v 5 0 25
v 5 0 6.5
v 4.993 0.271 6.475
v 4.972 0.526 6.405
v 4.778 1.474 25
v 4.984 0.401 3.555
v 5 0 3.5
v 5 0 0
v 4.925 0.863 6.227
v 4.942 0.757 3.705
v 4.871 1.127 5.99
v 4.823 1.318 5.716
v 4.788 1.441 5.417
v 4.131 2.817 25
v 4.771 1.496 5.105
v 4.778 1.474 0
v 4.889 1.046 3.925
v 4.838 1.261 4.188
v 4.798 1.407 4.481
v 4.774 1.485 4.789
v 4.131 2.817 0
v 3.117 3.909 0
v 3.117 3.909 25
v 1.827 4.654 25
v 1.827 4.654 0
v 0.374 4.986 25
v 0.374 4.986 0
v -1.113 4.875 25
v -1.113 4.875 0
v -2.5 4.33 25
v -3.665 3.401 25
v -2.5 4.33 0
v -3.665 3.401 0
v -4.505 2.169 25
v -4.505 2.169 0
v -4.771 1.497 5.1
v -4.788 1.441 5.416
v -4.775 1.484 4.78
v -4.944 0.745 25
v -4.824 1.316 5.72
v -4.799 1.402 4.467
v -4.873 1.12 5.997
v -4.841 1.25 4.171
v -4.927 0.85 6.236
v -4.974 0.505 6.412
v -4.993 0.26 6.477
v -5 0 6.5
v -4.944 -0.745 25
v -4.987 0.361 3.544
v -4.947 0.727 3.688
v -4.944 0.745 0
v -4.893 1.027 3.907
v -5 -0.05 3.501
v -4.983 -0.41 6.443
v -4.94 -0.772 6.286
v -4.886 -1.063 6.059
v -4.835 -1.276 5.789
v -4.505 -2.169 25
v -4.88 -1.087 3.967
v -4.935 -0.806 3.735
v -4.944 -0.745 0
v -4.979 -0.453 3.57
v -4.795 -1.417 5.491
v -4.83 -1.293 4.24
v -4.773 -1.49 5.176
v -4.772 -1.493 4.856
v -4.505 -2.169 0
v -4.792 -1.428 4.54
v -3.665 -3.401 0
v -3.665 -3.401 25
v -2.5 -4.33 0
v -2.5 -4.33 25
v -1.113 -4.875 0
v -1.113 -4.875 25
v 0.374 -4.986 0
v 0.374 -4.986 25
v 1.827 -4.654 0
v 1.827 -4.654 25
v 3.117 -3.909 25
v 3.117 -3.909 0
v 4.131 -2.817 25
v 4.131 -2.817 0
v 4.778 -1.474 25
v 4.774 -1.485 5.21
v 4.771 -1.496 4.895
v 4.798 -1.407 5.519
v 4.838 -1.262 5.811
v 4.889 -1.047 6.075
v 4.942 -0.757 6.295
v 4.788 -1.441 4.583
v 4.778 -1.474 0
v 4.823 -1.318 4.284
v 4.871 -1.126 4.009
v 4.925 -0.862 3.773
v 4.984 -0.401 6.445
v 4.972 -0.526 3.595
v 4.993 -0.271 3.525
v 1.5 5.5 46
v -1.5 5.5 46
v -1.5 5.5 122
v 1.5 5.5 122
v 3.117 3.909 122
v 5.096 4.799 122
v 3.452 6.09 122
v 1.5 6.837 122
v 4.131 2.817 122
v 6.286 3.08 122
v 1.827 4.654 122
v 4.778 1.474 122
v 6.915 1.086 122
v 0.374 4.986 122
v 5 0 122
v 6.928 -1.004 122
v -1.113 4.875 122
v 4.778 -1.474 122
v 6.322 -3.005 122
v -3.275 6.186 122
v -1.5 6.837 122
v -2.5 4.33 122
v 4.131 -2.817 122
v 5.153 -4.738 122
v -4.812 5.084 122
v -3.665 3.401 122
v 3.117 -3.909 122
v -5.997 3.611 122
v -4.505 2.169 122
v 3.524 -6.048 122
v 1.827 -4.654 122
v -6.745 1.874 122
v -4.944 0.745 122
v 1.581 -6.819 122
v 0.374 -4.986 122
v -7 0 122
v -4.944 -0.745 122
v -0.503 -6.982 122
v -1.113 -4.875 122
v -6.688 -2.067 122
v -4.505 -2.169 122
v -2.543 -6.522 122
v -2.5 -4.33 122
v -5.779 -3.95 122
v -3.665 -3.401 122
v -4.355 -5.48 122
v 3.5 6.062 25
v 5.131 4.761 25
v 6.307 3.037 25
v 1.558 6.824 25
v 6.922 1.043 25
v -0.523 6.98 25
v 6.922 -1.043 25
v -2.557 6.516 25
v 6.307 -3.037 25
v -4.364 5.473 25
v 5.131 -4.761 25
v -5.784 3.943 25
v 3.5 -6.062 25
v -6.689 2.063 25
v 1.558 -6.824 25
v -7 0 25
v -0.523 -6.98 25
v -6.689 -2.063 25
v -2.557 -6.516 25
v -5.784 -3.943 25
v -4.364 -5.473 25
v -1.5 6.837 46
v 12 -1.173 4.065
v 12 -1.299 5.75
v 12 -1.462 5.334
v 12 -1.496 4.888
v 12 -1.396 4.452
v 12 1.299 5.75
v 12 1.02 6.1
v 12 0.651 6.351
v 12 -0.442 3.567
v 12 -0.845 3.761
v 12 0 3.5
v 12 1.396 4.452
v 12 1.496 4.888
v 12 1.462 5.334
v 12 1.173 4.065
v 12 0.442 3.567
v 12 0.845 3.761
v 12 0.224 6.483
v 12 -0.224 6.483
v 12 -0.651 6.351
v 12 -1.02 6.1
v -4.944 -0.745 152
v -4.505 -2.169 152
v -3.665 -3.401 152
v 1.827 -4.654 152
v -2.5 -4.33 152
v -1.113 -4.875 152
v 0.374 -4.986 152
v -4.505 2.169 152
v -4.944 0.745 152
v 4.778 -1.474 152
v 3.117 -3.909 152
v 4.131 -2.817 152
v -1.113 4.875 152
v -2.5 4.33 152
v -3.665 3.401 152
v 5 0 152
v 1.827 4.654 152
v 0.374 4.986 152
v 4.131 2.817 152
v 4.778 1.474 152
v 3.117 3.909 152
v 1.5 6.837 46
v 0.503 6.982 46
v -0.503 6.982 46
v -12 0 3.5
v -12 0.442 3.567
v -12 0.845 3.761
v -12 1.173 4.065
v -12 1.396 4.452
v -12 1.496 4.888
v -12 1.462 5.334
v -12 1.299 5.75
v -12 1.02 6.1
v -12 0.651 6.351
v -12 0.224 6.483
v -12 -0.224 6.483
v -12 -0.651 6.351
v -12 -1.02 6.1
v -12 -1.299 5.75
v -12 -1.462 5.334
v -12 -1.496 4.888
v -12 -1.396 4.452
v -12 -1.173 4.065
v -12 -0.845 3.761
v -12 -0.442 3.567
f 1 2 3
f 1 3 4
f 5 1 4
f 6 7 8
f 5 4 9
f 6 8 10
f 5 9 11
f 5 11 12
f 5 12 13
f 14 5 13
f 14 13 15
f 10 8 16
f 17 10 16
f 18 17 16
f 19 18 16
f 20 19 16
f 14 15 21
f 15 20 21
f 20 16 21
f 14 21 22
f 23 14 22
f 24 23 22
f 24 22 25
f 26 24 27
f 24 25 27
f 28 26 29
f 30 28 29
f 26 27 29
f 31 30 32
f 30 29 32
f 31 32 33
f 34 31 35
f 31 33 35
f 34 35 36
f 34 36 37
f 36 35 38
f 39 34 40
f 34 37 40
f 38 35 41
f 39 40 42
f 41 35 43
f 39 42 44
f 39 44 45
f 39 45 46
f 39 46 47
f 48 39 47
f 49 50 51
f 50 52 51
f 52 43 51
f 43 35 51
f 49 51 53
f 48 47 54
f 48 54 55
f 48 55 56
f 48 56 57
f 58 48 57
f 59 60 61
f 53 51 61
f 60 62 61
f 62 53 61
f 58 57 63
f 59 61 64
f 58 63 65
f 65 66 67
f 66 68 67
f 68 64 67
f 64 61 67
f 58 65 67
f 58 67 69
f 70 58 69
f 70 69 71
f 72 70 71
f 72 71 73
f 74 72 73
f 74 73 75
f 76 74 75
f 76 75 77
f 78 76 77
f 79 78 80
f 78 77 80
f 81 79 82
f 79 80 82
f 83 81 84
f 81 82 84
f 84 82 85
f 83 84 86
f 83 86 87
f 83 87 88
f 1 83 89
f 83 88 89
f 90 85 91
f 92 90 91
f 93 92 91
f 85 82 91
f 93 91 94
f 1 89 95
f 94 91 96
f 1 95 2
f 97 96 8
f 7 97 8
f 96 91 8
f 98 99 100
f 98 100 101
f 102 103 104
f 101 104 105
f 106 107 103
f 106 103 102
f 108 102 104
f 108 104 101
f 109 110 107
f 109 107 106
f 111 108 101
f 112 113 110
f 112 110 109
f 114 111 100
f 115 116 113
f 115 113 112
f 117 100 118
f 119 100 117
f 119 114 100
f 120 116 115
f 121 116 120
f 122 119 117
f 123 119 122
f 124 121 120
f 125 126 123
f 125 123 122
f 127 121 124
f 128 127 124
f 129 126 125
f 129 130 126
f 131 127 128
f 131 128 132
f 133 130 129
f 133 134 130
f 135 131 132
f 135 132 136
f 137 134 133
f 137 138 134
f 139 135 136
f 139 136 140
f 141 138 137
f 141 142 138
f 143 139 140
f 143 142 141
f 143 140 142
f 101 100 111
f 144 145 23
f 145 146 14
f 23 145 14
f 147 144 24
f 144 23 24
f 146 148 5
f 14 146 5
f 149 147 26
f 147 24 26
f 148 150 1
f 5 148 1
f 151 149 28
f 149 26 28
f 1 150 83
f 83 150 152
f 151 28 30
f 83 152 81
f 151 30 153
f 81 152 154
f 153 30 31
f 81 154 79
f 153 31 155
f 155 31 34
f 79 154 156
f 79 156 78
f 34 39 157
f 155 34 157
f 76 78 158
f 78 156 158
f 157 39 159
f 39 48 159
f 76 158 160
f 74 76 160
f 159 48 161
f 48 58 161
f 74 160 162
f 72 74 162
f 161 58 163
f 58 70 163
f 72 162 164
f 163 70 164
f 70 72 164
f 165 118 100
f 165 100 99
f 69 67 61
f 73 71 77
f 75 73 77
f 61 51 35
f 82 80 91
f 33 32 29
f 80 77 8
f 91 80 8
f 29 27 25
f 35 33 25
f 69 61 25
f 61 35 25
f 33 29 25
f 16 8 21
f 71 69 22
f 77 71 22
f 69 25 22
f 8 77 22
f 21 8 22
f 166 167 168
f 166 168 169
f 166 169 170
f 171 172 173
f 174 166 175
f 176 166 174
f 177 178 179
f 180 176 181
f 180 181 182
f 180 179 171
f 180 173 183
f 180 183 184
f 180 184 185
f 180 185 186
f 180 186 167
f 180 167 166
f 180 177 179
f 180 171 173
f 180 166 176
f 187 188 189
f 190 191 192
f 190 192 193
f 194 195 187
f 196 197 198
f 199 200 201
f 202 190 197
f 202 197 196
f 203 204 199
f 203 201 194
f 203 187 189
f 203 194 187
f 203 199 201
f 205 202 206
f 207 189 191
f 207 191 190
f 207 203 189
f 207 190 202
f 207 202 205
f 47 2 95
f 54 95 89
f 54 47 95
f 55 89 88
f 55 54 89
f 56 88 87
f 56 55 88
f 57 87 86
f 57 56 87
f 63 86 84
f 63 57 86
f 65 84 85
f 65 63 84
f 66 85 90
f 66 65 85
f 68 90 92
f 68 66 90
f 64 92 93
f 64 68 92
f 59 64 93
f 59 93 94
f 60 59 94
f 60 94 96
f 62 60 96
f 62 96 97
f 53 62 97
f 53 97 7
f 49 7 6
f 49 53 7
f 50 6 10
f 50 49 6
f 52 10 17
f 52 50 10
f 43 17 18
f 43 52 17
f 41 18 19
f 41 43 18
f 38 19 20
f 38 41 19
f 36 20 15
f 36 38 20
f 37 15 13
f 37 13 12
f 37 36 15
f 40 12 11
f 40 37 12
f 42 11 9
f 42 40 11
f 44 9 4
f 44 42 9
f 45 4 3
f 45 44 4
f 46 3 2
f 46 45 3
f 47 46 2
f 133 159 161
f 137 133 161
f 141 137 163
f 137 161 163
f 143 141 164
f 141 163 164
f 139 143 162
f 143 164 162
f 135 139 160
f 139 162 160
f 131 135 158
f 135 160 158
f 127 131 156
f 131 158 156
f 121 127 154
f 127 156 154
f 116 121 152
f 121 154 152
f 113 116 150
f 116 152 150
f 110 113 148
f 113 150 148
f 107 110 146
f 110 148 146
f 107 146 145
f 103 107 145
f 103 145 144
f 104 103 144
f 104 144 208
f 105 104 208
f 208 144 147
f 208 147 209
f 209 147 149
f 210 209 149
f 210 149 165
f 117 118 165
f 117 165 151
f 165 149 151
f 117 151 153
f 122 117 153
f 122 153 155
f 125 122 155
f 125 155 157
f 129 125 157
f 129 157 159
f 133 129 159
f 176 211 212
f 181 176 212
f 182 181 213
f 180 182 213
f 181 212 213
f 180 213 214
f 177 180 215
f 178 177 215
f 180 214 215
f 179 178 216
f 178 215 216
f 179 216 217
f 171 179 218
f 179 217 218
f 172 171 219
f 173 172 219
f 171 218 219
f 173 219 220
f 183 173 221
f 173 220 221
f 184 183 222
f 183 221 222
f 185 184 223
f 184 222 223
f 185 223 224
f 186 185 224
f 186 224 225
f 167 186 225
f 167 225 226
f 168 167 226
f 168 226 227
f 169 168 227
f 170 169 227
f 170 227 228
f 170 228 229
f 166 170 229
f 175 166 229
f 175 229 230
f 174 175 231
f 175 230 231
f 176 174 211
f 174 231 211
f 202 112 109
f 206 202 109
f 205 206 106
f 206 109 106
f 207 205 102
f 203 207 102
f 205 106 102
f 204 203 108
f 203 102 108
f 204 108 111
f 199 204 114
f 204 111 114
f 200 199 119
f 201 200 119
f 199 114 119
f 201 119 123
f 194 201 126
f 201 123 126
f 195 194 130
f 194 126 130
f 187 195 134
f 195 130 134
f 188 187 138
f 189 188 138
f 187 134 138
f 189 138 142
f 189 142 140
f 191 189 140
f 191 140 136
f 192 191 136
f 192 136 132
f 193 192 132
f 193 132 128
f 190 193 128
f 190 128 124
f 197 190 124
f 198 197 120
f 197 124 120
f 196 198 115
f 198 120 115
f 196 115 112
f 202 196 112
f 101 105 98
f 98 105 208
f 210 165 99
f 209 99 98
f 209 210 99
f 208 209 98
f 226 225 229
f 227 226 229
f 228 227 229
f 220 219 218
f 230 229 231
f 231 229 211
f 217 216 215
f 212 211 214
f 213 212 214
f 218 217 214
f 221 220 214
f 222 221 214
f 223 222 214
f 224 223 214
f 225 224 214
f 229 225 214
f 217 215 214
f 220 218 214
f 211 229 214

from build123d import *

# Parameters (mm, degrees)
SKETCH1_R                = 5
BOSS_EXTRUDE1_DEPTH      = 25
SKETCH2_R                = 7
BOSS_EXTRUDE2_DEPTH      = 97
SKETCH3_R                = 5
BOSS_EXTRUDE3_DEPTH      = 30
CUT_EXTRUDE1_START       = 7
SKETCH4_W                = 3
SKETCH4_H                = 76
CUT_EXTRUDE1_DEPTH       = 1.5
CUT_EXTRUDE2_DEPTH       = 153.322027297
CUT_EXTRUDE2_DEPTH_BACK  = 153.322027297
SKETCH5_R                = 1.5
BOSS_EXTRUDE4_DEPTH      = 12
BOSS_EXTRUDE4_DEPTH_BACK = 12
SKETCH6_R                = 1.5


with BuildPart() as part:
    # Sketch1 → Boss-Extrude1 (new body)
    with BuildSketch(Plane.XY):
        Circle(SKETCH1_R)
    extrude(amount=BOSS_EXTRUDE1_DEPTH)

    # Sketch2 → Boss-Extrude2 (add)
    with BuildSketch(Plane.XY.offset(25)):
        with Locations(Location((0, 0, 0), (0, 0, 180))):
            Circle(SKETCH2_R)
    extrude(amount=BOSS_EXTRUDE2_DEPTH)

    # Sketch3 → Boss-Extrude3 (add)
    with BuildSketch(Plane.XY.offset(122)):
        Circle(SKETCH3_R)
    extrude(amount=BOSS_EXTRUDE3_DEPTH)

    # Sketch4 → Cut-Extrude1 (cut)
    with BuildSketch(Plane(origin=(0, 0, 0), x_dir=(1, 0, 0), z_dir=(0, 1, 0)).offset(CUT_EXTRUDE1_START)):
        with Locations((0, -84)):
            Rectangle(SKETCH4_W, SKETCH4_H)
    extrude(amount=-CUT_EXTRUDE1_DEPTH, mode=Mode.SUBTRACT)

    # Sketch5 → Cut-Extrude2 (cut, two sides: drawn at the far end of the back side and taken through both)
    with BuildSketch(Plane(origin=(0, 0, 0), x_dir=(0, 0, -1), z_dir=(1, 0, 0)).offset(-CUT_EXTRUDE2_DEPTH_BACK)):
        with Locations(Location((-5, 0, 0), (0, 0, 179.999999999))):
            Circle(SKETCH5_R)
    extrude(amount=CUT_EXTRUDE2_DEPTH + CUT_EXTRUDE2_DEPTH_BACK, mode=Mode.SUBTRACT)


with BuildPart() as body_2:
    # Sketch6 → Boss-Extrude4 (new, two sides: drawn at the far end of the back side and taken through both)
    with BuildSketch(Plane(origin=(0, 0, 0), x_dir=(0, 0, -1), z_dir=(1, 0, 0)).offset(-BOSS_EXTRUDE4_DEPTH_BACK)):
        with Locations((-5, 0)):
            Circle(SKETCH6_R)
    extrude(amount=BOSS_EXTRUDE4_DEPTH + BOSS_EXTRUDE4_DEPTH_BACK)


solid = Compound([part.part, body_2.part])
